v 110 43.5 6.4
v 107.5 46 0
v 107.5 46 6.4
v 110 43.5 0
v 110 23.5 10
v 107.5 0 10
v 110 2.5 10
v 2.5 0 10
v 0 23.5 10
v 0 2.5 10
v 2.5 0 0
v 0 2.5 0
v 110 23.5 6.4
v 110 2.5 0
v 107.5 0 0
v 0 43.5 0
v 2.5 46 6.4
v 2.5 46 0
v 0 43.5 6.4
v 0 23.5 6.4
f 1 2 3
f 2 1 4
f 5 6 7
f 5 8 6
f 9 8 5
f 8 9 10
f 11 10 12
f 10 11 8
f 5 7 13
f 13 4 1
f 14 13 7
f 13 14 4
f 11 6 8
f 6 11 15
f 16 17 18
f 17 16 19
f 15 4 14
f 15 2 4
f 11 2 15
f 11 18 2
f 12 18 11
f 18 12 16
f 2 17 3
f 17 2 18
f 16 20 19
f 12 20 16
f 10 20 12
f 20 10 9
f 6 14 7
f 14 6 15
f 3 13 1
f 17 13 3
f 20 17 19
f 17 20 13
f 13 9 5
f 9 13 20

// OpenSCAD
$fn = 32;

// ----------------------------------------------------------------------
// Stepped bar: sidestep, 110 x 46 x 10/6.4 mm
// ----------------------------------------------------------------------

// --- parameters (mm) ---
bar_l = 110;              // bar length, X
bar_w = 46;               // bar width, Y
plate_t = 10;             // thickness of the thick zone, Z
thin_t = 6.4;             // thickness of the thin zone
corner_c = 2.5;           // corner chamfer of the bar
step_cut = 3.6;           // material removed from the thin zone
ledge_y = 23.5;           // start of the ledge from the front edge
depth_1 = 3.6;            // depth of cut 1 from the top face
fit_tol = 0.05;           // declared fit tolerance (prompt contract)
free_tol = 0.2;           // declared free tolerance (prompt contract)

profile = [[2.5, 0], [107.5, 0], [110, 2.5], [110, 43.5], [107.5, 46], [2.5, 46], [0, 43.5], [0, 2.5]];  // primary outline, 8 points, counter clockwise
void_1 = [[-1, 23.5], [111, 23.5], [111, 47], [-1, 47]];  // ledge cut along one edge, 4 points

// --- the one profile operation ---
difference() {
  linear_extrude(height = plate_t) polygon(points = profile);
  translate([0, 0, plate_t - depth_1])
    linear_extrude(height = depth_1 + 1) polygon(points = void_1);
}
